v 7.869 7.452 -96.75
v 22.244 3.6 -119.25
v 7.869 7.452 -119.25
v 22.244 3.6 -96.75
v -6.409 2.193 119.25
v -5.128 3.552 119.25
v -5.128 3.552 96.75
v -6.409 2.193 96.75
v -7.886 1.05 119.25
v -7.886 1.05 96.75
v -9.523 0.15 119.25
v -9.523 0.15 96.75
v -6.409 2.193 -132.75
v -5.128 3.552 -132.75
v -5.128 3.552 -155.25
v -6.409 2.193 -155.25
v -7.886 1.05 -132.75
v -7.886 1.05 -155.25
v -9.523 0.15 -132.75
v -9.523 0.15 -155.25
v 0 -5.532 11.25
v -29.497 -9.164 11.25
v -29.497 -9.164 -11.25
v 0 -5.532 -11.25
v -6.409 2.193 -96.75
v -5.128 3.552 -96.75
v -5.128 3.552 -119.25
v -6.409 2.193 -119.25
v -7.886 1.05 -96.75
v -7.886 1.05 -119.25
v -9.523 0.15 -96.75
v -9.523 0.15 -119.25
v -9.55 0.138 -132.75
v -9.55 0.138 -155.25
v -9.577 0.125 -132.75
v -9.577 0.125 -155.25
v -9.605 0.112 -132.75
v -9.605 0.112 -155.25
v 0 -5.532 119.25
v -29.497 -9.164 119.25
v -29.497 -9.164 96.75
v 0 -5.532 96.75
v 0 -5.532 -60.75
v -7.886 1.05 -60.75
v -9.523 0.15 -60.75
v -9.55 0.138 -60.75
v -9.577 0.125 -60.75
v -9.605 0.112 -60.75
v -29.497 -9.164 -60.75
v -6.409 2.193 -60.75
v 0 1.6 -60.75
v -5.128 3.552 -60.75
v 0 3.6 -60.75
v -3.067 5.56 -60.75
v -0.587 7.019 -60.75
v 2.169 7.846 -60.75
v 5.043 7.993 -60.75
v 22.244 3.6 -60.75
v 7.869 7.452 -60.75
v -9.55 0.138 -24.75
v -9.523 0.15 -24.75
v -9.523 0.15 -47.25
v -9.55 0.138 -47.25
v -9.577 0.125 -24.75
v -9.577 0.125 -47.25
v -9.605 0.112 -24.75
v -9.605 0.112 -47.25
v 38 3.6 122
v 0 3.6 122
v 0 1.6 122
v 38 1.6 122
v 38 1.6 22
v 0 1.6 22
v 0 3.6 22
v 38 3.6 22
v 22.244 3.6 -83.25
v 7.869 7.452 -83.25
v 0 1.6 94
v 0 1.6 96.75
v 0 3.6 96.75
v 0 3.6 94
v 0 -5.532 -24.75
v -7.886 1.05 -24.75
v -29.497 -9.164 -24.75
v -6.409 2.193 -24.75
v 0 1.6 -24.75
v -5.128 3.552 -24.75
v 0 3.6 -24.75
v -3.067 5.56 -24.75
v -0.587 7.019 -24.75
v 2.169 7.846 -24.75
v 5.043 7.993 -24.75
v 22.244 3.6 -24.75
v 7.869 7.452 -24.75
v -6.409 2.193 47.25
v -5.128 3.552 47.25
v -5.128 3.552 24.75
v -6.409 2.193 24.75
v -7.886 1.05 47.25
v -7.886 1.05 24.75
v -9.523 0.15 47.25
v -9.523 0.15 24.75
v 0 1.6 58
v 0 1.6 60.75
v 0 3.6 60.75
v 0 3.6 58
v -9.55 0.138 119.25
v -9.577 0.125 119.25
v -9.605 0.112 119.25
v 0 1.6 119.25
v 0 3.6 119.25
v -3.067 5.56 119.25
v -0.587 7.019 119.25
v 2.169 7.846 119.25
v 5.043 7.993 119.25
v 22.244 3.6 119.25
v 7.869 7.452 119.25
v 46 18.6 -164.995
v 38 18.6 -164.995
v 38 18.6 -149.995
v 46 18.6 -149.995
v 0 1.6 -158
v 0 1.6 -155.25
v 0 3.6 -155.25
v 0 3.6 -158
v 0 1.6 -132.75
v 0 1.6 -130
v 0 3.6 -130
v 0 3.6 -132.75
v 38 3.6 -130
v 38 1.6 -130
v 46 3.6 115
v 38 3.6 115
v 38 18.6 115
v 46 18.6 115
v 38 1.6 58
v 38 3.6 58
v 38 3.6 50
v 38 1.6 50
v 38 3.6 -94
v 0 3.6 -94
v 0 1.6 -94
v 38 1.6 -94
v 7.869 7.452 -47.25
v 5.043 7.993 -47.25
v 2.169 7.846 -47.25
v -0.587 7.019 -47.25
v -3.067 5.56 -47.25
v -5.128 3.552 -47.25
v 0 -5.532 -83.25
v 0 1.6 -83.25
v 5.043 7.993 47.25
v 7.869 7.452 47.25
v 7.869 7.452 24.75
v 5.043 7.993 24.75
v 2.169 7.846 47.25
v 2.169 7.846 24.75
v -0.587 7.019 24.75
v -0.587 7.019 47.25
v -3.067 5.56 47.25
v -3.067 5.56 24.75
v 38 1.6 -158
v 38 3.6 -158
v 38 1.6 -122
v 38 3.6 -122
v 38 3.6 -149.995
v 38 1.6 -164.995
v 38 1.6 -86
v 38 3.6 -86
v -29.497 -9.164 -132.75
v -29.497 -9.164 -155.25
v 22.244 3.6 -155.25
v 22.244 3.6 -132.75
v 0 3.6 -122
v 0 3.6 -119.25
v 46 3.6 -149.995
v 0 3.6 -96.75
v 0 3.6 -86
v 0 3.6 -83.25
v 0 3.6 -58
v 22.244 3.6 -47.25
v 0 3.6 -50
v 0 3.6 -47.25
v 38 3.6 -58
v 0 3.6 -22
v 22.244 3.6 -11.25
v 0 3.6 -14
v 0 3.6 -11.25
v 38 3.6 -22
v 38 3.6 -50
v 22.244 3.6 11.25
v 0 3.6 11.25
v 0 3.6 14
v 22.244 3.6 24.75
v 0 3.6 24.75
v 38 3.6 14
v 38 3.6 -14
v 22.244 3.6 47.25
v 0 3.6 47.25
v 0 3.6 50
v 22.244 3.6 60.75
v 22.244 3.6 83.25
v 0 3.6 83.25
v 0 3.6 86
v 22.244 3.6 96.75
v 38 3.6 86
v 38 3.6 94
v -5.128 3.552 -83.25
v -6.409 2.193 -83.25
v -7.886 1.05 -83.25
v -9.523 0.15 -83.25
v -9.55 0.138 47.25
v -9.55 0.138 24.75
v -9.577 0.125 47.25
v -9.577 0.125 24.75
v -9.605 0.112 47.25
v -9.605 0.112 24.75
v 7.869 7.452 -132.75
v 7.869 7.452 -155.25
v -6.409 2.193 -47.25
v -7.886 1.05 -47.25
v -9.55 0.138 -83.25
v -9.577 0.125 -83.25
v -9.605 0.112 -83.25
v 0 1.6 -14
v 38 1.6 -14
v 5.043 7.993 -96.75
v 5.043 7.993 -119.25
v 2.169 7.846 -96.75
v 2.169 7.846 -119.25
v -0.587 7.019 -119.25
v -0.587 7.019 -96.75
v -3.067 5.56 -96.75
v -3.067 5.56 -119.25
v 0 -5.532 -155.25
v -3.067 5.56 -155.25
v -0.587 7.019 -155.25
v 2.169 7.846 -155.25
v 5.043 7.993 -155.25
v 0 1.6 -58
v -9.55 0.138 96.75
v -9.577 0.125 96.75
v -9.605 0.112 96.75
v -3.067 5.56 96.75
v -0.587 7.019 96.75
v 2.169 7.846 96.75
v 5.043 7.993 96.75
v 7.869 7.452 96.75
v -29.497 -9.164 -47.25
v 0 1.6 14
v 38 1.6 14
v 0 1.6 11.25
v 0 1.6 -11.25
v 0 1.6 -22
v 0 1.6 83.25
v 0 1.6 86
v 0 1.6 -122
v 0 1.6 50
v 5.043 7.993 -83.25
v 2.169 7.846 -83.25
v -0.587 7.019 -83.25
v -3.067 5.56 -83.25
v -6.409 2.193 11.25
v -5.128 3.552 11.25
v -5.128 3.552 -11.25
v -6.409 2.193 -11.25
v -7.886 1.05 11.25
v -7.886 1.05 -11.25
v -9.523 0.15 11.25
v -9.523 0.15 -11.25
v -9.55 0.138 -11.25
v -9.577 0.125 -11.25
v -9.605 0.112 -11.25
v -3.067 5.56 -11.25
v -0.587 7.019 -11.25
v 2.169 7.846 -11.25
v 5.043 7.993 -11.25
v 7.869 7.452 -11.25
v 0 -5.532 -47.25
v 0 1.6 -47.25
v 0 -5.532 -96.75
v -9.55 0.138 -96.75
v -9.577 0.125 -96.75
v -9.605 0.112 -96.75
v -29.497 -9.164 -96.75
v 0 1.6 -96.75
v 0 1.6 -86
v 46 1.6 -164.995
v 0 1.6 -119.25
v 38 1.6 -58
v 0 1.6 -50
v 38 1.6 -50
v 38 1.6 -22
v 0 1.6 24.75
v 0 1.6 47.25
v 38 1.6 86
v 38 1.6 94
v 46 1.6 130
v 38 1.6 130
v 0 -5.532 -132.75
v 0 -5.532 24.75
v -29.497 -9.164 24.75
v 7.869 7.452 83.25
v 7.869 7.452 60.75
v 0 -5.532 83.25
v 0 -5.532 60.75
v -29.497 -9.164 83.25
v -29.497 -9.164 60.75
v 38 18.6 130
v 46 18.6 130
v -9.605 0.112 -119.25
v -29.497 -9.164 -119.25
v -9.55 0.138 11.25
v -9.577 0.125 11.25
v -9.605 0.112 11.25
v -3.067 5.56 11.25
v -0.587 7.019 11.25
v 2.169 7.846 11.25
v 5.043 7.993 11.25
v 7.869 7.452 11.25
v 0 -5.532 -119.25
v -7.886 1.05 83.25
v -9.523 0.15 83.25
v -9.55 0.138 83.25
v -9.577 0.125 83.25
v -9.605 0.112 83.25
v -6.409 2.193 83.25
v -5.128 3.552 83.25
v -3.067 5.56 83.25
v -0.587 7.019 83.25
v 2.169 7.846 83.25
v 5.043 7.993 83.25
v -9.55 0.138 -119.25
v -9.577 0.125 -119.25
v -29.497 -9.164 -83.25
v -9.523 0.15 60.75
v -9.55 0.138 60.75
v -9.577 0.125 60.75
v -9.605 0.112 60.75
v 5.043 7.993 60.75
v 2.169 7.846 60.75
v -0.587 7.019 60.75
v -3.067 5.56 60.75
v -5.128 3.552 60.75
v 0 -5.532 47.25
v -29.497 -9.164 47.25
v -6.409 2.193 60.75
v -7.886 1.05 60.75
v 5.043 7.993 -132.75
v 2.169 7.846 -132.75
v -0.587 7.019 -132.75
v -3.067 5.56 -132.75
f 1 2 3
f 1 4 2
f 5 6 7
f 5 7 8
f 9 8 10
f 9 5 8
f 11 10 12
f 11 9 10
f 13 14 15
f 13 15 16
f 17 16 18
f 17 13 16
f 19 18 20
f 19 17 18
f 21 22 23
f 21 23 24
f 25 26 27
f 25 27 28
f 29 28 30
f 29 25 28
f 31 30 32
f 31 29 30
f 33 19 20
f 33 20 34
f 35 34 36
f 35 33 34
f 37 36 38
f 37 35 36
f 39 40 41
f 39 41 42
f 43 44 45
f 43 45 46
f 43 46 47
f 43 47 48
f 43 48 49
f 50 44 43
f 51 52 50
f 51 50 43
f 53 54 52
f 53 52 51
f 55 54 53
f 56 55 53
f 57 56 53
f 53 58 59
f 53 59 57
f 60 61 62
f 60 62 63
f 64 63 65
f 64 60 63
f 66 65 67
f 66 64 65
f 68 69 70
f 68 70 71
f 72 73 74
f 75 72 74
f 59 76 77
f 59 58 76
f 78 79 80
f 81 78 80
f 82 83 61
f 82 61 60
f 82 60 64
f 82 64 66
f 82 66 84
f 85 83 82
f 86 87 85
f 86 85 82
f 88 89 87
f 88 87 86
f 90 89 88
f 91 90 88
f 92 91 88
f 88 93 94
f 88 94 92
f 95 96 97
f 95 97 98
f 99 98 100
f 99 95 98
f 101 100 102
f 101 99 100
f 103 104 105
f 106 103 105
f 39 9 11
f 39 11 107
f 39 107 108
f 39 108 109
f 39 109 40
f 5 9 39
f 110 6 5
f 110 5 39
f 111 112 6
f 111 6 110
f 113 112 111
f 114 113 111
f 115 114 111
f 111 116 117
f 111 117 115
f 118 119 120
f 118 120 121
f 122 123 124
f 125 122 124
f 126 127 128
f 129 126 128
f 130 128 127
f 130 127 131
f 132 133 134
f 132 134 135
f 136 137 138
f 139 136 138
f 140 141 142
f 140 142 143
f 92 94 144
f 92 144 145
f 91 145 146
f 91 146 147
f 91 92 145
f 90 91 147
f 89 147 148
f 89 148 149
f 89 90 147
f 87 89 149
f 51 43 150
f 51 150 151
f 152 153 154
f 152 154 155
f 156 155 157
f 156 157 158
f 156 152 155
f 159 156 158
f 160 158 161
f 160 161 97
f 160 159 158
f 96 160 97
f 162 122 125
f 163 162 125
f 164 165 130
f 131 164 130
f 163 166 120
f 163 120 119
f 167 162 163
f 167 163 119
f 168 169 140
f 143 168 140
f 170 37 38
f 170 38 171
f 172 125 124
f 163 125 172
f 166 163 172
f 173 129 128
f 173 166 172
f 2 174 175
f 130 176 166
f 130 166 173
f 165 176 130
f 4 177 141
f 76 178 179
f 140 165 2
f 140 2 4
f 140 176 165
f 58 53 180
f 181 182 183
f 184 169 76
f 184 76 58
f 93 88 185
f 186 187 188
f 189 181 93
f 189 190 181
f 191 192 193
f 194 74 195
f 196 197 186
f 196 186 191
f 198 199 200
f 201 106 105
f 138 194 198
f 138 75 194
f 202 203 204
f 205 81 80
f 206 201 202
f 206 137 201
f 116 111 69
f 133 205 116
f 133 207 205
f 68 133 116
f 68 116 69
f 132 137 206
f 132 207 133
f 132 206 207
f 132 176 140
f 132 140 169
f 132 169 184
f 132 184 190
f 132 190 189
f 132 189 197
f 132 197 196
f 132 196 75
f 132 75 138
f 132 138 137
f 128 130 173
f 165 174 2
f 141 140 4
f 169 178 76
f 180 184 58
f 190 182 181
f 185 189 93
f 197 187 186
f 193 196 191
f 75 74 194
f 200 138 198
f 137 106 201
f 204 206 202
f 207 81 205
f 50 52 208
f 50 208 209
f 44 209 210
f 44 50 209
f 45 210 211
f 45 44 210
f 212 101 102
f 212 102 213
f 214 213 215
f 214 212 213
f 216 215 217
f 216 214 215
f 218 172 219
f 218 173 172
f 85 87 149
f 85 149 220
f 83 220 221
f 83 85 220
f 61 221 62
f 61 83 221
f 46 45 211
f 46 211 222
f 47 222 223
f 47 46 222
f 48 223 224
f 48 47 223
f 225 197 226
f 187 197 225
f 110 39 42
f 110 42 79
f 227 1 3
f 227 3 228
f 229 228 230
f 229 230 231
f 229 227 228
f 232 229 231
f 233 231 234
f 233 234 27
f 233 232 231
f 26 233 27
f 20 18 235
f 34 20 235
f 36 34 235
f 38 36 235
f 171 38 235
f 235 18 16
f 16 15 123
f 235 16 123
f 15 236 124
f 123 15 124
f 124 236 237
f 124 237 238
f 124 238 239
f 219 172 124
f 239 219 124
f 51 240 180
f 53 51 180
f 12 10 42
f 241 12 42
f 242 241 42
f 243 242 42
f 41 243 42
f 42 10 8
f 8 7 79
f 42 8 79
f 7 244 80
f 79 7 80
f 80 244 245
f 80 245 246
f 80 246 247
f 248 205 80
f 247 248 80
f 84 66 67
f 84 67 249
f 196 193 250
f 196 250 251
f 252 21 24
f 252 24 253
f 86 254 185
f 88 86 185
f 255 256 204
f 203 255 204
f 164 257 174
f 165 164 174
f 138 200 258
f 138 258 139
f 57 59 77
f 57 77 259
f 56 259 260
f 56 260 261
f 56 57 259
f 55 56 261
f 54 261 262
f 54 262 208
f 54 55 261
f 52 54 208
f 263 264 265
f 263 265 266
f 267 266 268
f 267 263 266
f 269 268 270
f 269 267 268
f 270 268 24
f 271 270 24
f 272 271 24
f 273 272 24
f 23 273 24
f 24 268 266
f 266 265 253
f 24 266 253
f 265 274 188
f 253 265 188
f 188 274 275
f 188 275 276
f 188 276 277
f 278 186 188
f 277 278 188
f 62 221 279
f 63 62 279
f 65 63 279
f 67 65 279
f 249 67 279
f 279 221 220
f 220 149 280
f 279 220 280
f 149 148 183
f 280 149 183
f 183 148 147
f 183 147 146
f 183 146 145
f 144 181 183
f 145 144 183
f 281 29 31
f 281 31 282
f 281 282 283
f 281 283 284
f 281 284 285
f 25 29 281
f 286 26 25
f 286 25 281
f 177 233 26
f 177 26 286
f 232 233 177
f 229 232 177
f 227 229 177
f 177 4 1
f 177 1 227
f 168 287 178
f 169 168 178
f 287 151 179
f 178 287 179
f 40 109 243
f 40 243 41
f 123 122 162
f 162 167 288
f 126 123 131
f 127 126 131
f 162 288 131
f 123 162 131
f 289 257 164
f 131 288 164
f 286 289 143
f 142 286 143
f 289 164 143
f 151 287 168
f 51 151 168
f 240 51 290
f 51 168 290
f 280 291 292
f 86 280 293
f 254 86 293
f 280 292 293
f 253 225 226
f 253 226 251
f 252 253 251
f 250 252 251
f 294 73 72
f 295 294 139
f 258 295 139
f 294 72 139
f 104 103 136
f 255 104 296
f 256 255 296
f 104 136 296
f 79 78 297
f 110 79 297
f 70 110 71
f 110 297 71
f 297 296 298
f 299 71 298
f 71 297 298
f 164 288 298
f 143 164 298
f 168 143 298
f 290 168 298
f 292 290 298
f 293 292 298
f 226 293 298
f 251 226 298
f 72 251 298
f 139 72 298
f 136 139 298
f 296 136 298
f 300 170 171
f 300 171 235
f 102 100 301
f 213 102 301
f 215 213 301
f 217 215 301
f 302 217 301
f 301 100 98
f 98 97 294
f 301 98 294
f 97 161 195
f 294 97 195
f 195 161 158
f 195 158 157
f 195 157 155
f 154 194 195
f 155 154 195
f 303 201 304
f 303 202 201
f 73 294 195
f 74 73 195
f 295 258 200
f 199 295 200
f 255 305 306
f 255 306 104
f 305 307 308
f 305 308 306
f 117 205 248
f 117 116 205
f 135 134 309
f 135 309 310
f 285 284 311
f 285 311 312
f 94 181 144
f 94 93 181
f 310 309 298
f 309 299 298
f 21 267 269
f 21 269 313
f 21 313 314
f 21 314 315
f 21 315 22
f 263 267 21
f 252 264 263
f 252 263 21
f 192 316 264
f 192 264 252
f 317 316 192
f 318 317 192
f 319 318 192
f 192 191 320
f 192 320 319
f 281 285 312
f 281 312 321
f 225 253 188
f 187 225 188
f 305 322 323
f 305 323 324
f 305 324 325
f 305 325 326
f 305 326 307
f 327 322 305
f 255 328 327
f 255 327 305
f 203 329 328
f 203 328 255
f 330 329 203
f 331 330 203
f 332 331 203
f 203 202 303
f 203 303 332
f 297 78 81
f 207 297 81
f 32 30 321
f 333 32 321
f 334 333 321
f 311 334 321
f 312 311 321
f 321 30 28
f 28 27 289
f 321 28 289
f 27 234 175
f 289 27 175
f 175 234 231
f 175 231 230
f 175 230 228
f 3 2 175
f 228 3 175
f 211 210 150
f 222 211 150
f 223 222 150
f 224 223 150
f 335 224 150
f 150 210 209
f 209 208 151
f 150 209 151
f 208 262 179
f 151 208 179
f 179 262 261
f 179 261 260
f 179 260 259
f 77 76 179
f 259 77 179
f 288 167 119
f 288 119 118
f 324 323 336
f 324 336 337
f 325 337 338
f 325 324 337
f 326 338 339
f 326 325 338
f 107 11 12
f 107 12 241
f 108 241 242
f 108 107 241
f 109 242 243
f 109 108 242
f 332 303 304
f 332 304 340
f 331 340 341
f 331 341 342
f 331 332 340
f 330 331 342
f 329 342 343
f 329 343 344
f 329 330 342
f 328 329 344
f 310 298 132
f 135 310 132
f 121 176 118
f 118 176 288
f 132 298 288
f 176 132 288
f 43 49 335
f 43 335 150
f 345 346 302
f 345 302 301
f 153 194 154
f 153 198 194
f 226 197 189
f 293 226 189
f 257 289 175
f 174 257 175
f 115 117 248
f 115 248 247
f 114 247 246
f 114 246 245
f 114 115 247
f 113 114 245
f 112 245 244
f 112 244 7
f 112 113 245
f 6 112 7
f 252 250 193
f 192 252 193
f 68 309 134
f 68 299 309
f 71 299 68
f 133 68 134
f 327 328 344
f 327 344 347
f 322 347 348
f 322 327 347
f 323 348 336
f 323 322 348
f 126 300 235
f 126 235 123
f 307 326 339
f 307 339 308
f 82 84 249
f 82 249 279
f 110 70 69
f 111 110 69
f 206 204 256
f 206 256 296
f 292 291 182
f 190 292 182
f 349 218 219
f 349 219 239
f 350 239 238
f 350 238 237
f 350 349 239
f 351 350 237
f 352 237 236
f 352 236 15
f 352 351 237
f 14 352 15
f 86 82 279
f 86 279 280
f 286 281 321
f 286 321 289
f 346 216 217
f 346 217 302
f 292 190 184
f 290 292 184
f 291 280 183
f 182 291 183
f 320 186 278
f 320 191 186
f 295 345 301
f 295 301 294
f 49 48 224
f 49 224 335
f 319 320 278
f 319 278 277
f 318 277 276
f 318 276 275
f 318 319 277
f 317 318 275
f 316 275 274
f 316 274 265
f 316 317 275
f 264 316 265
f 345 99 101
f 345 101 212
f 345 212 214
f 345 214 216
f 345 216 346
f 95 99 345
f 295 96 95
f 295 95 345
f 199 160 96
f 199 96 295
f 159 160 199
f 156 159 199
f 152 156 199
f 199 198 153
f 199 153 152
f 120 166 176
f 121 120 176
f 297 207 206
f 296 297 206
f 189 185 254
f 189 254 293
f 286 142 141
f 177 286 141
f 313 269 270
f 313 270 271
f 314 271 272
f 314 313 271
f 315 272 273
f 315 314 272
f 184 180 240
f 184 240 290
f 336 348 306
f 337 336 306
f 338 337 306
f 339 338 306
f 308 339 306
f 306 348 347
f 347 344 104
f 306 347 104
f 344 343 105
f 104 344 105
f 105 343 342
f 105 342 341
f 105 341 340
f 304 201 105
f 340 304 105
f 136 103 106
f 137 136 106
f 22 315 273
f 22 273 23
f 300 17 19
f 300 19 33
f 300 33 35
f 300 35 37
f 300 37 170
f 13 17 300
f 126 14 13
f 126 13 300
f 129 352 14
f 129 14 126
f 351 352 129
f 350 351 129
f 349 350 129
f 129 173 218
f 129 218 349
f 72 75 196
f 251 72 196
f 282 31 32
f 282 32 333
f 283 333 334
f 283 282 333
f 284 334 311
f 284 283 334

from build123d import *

# Parameters (mm, degrees)
EXTRUDE1_DEPTH       = 11.25
SKETCH3_W            = 22.5
SKETCH3_H            = 5.033767183
EXTRUDE2_DEPTH       = 10
EXTRUDE3_DEPTH       = 14
SKETCH5_W            = 10
SKETCH5_H            = 2
EXTRUDE4_DEPTH       = 167.995
LPATTERN1_OUTLINE_W  = 2
LPATTERN1_OUTLINE_H  = 28
LPATTERN1_DEPTH      = 36
EXTRUDE6_DEPTH       = 175.64601587
EXTRUDE6_DEPTH_BACK  = 175.64601587
SKETCH7_W            = 3
SKETCH7_H            = 2
EXTRUDE7_DEPTH       = 36
LPATTERN2_COUNT      = 4
LPATTERN2_PITCH      = 36
LPATTERN2_COUNT_DIR2 = 5
LPATTERN2_PITCH_DIR2 = 36
SKETCH8_W            = 2
SKETCH8_H            = 6.995
SKETCH8_H_2          = 8
EXTRUDE8_DEPTH       = 175.64601587
EXTRUDE9_DEPTH       = 175.64601587
SKETCH10_W           = 7.252078552
SKETCH10_H           = 8.610092753
EXTRUDE10_DEPTH      = 290.080499228
SKETCH11_W           = 8
SKETCH11_H           = 15
EXTRUDE11_DEPTH      = 15


# Read off the part's stored shape, not the designer's step: LPattern1
with BuildPart() as part:
    # Sketch1 → Extrude1 (new, symmetric)
    with BuildSketch(Plane.XY):
        with BuildLine():
            Line((22.243678564, 3.6), (7.8688831, 7.451714836))
            ThreePointArc((7.8688831, 7.451714836), (0.766318838, 7.515222423), (-5.127958891, 3.551897764))
            ThreePointArc((-5.127958891, 3.551897764), (-7.125613619, 1.593106665), (-9.522547255, 0.150124985))
            ThreePointArc((-9.522547255, 0.150124985), (-9.563578628, 0.131412483), (-9.604503865, 0.11246898))
            Line((-9.604503865, 0.11246898), (-29.497211353, -9.163652863))
            Line((-29.497211353, -9.163652863), (4.045876789, -5.033767183))
            Line((4.045876789, -5.033767183), (4.045876789, 0))
            Line((4.045876789, 0), (0, 0))
            Line((0, 0), (0, 3.6))
            Line((0, 3.6), (22.243678564, 3.6))
        make_face()
    extrude1 = extrude(amount=EXTRUDE1_DEPTH, both=True)

    # Sketch3 → Extrude2 (cut)
    with BuildSketch(Plane(origin=(4.045876789, 0, 0), x_dir=(0, 0, -1), z_dir=(1, 0, 0))):
        with Locations((0, -2.516883592)):
            Rectangle(SKETCH3_W, SKETCH3_H)
    extrude(amount=-EXTRUDE2_DEPTH, mode=Mode.SUBTRACT)

    # Sketch4 → Extrude3 (add, symmetric)
    with BuildSketch(Plane.XY):
        Polygon((0, 1.6), (0, 3.6), (22.243678564, 3.6), (36, 3.6), (36, 1.6), align=None)
    extrude(amount=EXTRUDE3_DEPTH, both=True)

    # Sketch5 → Extrude4 (add, symmetric)
    with BuildSketch(Plane.XY):
        with Locations((41, 2.6)):
            Rectangle(SKETCH5_W, SKETCH5_H)
    extrude(amount=EXTRUDE4_DEPTH, both=True)

    # LPattern1 outline → LPattern1 (add)
    with BuildSketch(Plane.YZ):
        with Locations((2.6, -144)):
            Rectangle(LPATTERN1_OUTLINE_W, LPATTERN1_OUTLINE_H)
        with Locations((2.6, -108)):
            Rectangle(LPATTERN1_OUTLINE_W, LPATTERN1_OUTLINE_H)
        with Locations((2.6, -72)):
            Rectangle(LPATTERN1_OUTLINE_W, LPATTERN1_OUTLINE_H)
        with Locations((2.6, -36)):
            Rectangle(LPATTERN1_OUTLINE_W, LPATTERN1_OUTLINE_H)
        with Locations((2.6, 36)):
            Rectangle(LPATTERN1_OUTLINE_W, LPATTERN1_OUTLINE_H)
        with Locations((2.6, 72)):
            Rectangle(LPATTERN1_OUTLINE_W, LPATTERN1_OUTLINE_H)
        with Locations((2.6, 108)):
            Rectangle(LPATTERN1_OUTLINE_W, LPATTERN1_OUTLINE_H)
        with Locations((2.6, 144)):
            Rectangle(LPATTERN1_OUTLINE_W, LPATTERN1_OUTLINE_H)
    extrude(amount=LPATTERN1_DEPTH)

    # Sketch6 → Extrude6 (cut, two sides: drawn at the far end of the back side and taken through both)
    with BuildSketch(Plane(origin=(0, 3.6, 0), x_dir=(1, 0, 0), z_dir=(0, 1, 0)).offset(-EXTRUDE6_DEPTH_BACK)):
        Polygon((-630.637797583, -133), (0, -133), (46, -133), (676.637797583, -133), (676.637797583, -1394.275595165), (-630.637797583, -1394.275595165), align=None)
    extrude(amount=EXTRUDE6_DEPTH + EXTRUDE6_DEPTH_BACK, mode=Mode.SUBTRACT)

    # Sketch7 → Extrude7 (add)
    with BuildSketch(Plane.ZY.offset(-36)):
        with Locations((-166.495, 2.6)):
            Rectangle(SKETCH7_W, SKETCH7_H)
    extrude(amount=EXTRUDE7_DEPTH)

    # LPattern2: Extrude1 4 × 5
    with Locations(*[Vector(0, 0, 1) * (i * LPATTERN2_PITCH) + Vector(0, 0, -1) * (j * LPATTERN2_PITCH_DIR2) for i in range(LPATTERN2_COUNT) for j in range(LPATTERN2_COUNT_DIR2) if (i, j) != (0, 0)]):
        add(extrude1)

    # Sketch8 → Extrude8 (cut, through all)
    with BuildSketch(Plane(origin=(0, 3.6, 0), x_dir=(1, 0, 0), z_dir=(0, 1, 0))):
        with Locations((37, 161.4975)):
            Rectangle(SKETCH8_W, SKETCH8_H)
        with Locations((37, 126)):
            Rectangle(SKETCH8_W, SKETCH8_H_2)
        with Locations((37, 90)):
            Rectangle(SKETCH8_W, SKETCH8_H_2)
        with Locations((37, 54)):
            Rectangle(SKETCH8_W, SKETCH8_H_2)
        with Locations((37, 18)):
            Rectangle(SKETCH8_W, SKETCH8_H_2)
        with Locations((37, -18)):
            Rectangle(SKETCH8_W, SKETCH8_H_2)
        with Locations((37, -54)):
            Rectangle(SKETCH8_W, SKETCH8_H_2)
        with Locations((37, -90)):
            Rectangle(SKETCH8_W, SKETCH8_H_2)
        with Locations((37, -126)):
            Rectangle(SKETCH8_W, SKETCH8_H_2)
    extrude(amount=-EXTRUDE8_DEPTH, mode=Mode.SUBTRACT)

    # Sketch9 → Extrude9 (cut, through all)
    with BuildSketch(Plane(origin=(0, 3.6, 0), x_dir=(1, 0, 0), z_dir=(0, 1, 0))):
        Polygon((38, 164.995), (46, 164.995), (46, 167.995), (0, 167.995), (0, 164.995), align=None)
        Polygon((38, -130), (46, -130), (46, -133), (0, -133), (0, -130), align=None)
    extrude(amount=-EXTRUDE9_DEPTH, mode=Mode.SUBTRACT)

    # Sketch10 → Extrude10 (cut, through all)
    with BuildSketch(Plane(origin=(0, 0, -155.25), x_dir=(-1, 0, 0), z_dir=(0, 0, -1))):
        with Locations((-3.626039276, -2.705046377)):
            Rectangle(SKETCH10_W, SKETCH10_H)
    extrude(amount=-EXTRUDE10_DEPTH, mode=Mode.SUBTRACT)

    # Sketch11 → Extrude11 (add)
    with BuildSketch(Plane(origin=(0, 3.6, 0), x_dir=(1, 0, 0), z_dir=(0, 1, 0))):
        with Locations((42, 157.495)):
            Rectangle(SKETCH11_W, SKETCH11_H)
        with Locations((42, -122.5)):
            Rectangle(SKETCH11_W, SKETCH11_H)
    extrude(amount=EXTRUDE11_DEPTH)


solid = part.part
